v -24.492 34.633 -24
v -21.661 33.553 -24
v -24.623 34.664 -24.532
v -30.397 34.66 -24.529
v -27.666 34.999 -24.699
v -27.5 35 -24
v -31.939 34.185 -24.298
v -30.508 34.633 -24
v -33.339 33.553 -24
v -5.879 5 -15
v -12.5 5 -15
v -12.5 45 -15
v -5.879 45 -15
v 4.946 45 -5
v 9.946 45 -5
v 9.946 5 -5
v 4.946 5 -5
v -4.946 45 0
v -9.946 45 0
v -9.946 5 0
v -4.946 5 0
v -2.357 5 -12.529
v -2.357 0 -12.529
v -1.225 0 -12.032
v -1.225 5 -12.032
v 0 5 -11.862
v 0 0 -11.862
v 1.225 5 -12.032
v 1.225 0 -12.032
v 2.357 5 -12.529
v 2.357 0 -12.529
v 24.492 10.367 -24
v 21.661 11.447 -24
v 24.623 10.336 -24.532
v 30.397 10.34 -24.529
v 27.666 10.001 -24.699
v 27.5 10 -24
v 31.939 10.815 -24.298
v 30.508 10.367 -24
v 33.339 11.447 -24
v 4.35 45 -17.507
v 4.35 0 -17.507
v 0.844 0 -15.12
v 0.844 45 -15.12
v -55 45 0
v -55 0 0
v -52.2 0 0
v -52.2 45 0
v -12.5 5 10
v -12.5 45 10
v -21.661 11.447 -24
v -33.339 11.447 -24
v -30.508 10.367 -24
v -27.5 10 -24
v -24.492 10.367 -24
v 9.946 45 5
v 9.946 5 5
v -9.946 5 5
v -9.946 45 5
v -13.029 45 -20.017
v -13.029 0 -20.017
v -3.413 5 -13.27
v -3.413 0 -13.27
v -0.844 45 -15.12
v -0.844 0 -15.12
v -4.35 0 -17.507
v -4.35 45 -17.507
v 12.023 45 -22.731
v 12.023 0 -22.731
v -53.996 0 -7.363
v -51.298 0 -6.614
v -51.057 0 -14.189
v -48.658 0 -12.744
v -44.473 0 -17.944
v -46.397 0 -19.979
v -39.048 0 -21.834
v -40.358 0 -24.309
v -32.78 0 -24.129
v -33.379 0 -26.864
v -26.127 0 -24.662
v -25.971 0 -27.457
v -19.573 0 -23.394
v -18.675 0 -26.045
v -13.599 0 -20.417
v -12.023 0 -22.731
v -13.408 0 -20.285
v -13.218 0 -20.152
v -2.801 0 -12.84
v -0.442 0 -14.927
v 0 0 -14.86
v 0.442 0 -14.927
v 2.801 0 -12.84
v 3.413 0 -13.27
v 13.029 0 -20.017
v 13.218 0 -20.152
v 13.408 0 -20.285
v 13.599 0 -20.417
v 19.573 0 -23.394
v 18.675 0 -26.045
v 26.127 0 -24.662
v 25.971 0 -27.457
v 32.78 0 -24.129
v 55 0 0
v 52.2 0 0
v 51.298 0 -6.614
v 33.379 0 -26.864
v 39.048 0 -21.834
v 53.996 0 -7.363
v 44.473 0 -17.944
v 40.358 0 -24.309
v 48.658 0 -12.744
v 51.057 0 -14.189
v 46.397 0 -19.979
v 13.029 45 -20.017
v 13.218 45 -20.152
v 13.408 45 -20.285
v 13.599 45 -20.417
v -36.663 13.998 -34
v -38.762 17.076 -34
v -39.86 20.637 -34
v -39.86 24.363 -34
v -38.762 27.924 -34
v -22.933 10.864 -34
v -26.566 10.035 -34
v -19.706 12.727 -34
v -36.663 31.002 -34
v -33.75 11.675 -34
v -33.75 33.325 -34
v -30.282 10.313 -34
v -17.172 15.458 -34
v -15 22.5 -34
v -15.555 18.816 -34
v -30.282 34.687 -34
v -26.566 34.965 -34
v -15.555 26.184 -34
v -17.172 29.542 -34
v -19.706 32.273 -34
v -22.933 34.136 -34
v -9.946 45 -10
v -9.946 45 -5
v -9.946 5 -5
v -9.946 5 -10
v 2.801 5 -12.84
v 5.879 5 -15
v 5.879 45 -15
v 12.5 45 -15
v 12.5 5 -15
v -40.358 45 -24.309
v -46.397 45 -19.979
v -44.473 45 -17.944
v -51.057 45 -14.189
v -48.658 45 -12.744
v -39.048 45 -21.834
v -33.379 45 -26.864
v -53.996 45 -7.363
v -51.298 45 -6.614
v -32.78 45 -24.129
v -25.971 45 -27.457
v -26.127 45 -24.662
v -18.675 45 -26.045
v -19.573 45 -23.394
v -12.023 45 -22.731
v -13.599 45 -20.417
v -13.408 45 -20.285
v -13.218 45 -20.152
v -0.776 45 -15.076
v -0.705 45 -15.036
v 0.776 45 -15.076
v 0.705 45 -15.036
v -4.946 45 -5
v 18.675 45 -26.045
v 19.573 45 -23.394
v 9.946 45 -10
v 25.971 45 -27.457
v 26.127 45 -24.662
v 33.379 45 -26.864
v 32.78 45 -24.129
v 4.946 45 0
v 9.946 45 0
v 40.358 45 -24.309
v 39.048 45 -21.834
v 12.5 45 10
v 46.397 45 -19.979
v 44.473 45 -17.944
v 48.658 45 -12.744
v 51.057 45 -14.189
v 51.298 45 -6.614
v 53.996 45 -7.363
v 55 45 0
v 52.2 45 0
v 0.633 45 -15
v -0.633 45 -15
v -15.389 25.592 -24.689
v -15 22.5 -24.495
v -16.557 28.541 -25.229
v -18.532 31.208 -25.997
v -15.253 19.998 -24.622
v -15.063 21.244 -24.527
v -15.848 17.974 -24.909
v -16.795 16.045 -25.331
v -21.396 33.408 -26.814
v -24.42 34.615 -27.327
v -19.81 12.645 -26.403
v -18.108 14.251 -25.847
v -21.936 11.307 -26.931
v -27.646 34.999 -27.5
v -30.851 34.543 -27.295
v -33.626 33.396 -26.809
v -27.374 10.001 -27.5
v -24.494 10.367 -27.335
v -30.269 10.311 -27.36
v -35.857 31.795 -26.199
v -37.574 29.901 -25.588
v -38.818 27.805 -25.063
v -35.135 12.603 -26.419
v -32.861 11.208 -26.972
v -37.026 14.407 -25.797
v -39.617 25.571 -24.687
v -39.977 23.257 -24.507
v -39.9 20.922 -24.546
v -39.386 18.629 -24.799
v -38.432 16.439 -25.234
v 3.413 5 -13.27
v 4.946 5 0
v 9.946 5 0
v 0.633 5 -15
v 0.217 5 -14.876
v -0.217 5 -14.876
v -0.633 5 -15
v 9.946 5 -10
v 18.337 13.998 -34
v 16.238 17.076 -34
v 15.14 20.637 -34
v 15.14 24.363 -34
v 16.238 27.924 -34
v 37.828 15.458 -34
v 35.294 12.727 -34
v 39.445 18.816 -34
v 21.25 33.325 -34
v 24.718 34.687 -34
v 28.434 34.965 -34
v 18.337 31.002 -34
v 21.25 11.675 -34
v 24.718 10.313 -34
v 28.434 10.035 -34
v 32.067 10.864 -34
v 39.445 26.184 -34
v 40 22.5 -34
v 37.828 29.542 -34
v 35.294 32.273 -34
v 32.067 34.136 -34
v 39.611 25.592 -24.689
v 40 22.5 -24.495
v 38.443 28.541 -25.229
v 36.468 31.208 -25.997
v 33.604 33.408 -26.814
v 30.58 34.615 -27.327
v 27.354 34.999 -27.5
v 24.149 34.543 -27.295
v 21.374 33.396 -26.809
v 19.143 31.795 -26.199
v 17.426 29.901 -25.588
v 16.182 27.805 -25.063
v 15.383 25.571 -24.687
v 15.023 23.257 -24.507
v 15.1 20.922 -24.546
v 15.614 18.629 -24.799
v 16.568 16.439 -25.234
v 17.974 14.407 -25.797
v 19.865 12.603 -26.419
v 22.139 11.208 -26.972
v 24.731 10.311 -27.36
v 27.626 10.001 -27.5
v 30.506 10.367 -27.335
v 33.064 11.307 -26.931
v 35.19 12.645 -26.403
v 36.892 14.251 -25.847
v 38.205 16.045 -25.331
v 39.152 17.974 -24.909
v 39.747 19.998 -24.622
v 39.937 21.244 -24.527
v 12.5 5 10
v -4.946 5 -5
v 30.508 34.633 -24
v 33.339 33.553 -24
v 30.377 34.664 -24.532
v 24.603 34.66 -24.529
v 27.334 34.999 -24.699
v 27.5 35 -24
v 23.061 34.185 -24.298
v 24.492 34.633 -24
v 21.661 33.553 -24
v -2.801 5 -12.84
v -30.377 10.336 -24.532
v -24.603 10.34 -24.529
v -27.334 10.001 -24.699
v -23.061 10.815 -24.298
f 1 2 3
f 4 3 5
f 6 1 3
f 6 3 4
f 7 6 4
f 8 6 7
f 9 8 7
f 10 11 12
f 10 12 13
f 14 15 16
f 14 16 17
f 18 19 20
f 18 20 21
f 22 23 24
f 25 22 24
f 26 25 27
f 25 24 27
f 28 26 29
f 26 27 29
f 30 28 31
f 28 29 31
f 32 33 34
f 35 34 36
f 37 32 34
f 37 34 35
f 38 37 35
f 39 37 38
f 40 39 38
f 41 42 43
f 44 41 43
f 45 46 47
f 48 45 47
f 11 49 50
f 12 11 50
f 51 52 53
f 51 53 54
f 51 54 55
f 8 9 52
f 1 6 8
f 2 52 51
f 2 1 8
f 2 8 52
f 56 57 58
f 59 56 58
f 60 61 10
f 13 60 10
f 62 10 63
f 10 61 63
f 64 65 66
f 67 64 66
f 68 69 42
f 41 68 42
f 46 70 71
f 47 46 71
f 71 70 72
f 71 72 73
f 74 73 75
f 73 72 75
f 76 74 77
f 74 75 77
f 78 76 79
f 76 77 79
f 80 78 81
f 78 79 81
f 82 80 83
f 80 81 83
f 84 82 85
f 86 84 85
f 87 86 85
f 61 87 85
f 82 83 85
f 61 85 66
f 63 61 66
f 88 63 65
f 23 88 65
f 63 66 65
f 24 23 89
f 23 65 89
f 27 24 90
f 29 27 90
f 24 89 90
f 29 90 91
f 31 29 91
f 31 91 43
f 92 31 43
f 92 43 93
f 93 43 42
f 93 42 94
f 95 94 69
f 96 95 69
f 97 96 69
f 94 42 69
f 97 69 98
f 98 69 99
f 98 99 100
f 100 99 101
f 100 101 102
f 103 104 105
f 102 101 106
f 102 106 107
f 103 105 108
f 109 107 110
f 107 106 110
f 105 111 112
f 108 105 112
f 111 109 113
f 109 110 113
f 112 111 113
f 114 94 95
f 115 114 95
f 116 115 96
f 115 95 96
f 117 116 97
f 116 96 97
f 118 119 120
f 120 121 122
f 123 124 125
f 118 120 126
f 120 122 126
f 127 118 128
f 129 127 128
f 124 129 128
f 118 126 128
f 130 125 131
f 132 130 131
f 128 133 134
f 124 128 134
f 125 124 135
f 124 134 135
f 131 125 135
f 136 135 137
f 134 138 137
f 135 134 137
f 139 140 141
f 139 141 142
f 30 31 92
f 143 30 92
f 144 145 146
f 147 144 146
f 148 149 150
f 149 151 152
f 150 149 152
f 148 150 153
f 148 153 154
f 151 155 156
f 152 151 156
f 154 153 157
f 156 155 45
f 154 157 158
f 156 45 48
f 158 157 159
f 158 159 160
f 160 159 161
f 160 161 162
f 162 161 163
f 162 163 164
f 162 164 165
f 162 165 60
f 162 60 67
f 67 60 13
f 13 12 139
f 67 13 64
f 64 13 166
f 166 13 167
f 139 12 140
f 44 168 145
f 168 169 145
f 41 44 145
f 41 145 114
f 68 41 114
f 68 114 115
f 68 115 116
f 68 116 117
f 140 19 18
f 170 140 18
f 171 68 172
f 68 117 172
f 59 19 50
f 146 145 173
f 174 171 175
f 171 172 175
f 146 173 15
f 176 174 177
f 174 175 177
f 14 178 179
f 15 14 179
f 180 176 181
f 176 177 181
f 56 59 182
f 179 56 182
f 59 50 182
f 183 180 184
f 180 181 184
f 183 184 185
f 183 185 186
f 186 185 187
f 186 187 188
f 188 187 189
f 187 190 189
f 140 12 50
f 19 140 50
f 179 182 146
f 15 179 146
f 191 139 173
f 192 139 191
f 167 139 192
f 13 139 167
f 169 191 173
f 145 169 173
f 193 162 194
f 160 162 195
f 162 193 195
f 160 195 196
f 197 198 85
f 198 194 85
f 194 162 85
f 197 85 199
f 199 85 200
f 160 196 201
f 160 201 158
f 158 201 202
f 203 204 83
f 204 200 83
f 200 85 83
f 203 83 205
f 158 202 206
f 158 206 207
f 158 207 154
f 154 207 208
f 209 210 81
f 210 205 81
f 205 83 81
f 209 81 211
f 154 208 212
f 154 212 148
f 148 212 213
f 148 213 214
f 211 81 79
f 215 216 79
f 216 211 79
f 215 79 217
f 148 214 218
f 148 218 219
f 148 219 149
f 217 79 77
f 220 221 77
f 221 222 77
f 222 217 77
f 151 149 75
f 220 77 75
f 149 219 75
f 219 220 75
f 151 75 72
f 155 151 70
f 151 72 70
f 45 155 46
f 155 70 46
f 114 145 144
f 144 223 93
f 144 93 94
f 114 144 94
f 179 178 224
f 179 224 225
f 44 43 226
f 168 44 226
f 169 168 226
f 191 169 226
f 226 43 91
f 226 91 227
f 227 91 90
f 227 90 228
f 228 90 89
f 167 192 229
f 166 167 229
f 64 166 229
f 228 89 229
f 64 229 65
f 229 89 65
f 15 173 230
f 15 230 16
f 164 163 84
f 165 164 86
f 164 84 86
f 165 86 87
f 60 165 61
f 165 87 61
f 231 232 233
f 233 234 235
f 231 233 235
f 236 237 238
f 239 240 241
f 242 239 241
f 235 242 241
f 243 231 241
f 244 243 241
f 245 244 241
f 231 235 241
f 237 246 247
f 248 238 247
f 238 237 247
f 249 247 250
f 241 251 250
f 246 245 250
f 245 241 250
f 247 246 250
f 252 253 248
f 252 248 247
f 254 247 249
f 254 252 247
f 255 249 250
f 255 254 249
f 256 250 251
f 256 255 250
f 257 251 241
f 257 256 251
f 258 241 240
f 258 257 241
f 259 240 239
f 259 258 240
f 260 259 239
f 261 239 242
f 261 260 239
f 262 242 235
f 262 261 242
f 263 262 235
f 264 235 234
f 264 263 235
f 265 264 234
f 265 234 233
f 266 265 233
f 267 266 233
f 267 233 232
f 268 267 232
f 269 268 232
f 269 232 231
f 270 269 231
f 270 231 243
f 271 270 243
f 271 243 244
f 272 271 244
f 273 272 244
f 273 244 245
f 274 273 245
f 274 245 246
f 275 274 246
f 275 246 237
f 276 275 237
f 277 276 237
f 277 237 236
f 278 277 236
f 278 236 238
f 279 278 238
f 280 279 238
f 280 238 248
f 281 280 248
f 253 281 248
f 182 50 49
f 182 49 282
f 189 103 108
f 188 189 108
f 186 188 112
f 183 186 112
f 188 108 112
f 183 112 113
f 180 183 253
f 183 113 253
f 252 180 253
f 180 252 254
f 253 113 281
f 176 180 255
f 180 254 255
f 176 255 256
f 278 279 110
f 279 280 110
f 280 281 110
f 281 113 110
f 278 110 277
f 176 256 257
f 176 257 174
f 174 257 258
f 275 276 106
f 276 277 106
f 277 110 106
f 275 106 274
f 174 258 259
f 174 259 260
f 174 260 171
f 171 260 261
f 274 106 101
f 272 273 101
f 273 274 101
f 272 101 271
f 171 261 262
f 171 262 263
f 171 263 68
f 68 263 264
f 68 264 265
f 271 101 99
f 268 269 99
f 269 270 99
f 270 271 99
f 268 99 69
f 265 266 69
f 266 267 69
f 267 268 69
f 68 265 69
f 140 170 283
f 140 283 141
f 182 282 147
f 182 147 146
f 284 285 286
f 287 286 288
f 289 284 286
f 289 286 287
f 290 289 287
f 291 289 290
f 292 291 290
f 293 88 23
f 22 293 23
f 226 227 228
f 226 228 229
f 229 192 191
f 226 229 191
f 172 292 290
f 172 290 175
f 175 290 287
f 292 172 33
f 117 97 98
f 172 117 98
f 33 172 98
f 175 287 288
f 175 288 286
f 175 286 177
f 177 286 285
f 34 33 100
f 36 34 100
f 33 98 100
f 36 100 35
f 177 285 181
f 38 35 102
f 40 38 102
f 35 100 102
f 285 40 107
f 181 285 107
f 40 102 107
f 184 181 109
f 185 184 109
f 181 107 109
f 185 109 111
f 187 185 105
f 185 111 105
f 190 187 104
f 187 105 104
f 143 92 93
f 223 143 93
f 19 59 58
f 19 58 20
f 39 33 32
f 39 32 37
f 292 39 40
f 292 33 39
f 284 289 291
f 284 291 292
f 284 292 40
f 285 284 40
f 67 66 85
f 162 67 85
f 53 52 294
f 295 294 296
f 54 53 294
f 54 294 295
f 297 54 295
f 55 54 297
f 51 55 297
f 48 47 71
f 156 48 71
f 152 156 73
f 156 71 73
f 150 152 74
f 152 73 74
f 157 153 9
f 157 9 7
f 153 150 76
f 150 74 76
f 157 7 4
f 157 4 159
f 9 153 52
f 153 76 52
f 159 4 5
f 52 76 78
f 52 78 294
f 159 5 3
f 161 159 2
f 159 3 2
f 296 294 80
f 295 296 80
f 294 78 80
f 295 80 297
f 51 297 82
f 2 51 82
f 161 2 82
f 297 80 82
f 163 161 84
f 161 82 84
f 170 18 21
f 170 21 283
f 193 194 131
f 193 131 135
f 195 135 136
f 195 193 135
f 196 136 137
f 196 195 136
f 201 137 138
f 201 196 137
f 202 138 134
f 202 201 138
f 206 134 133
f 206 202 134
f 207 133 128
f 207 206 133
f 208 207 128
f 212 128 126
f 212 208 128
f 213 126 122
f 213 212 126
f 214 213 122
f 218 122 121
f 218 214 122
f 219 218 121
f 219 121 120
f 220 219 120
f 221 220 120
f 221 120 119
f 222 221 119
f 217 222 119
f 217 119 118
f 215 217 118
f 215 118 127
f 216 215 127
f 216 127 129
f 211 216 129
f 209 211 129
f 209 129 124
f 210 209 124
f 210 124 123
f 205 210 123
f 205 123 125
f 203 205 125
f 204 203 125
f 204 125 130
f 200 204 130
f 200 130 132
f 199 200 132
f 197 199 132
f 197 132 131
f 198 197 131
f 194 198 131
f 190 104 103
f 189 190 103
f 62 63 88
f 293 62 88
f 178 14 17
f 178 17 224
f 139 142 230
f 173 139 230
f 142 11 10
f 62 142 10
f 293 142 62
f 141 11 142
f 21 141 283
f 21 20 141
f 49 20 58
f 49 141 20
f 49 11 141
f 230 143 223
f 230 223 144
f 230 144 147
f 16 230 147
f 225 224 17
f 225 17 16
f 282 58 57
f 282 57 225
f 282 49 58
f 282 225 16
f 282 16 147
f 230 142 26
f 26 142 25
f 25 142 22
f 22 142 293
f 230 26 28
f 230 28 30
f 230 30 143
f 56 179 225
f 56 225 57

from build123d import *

# Parameters (mm, degrees)
BOSS_EXTRUDE2_DEPTH     = 45
BOSS_EXTRUDE4_START     = -24
SKETCH2_R               = 12.5
BOSS_EXTRUDE4_DEPTH     = 10
BOSS_EXTRUDE6_START     = 10
SKETCH3_W               = 25
SKETCH3_H               = 40
BOSS_EXTRUDE6_DEPTH     = 25
CUT_EXTRUDE1_DEPTH      = 46.0000001
CUT_EXTRUDE1_DEPTH_BACK = 20


with BuildPart() as part:
    # Sketch1 → Boss-Extrude2 (new body)
    with BuildSketch(Plane(origin=(0, 0, 0), x_dir=(1, 0, 0), z_dir=(0, 1, 0))):
        with BuildLine():
            ThreePointArc((-2.801227604, 12.840197836), (-3.388966753, 13.401826964), (-3.866028841, 14.06006427))
            ThreePointArc((-3.866028841, 14.06006427), (-3.636455498, 13.666793472), (-3.413425605, 13.269775202))
            Line((-3.413425605, 13.269775202), (-2.801227604, 12.840197836))
        make_face()
        with BuildLine():
            Line((-4.349767454, 17.506911707), (-12.023106204, 22.731382677))
            ThreePointArc((-12.023106204, 22.731382677), (-7.469700948, 18.842428715), (-3.866028841, 14.06006427))
            ThreePointArc((-3.866028841, 14.06006427), (-4.454774574, 15.734806542), (-4.349767454, 17.506911707))
        make_face()
        with BuildLine():
            Line((-0.844194207, 15.120106399), (-4.349767454, 17.506911707))
            ThreePointArc((-4.349767454, 17.506911707), (-4.454774574, 15.734806542), (-3.866028841, 14.06006427))
            ThreePointArc((-3.866028841, 14.06006427), (-3.388966753, 13.401826964), (-2.801227604, 12.840197836))
            Line((-2.801227604, 12.840197836), (-2.357112674, 12.528563819))
            ThreePointArc((-2.357112674, 12.528563819), (0, 11.861568788), (2.357112674, 12.528563819))
            Line((2.357112674, 12.528563819), (2.801227604, 12.840197836))
            ThreePointArc((2.801227604, 12.840197836), (3.388966727, 13.401826933), (3.8660288, 14.0600642))
            ThreePointArc((3.8660288, 14.0600642), (4.337450172, 15.167351949), (4.498431212, 16.36))
            ThreePointArc((4.498431212, 16.36), (4.461110458, 16.93825327), (4.349767454, 17.506911707))
            Line((4.349767454, 17.506911707), (0.844194207, 15.120106399))
            ThreePointArc((0.844194207, 15.120106399), (0, 14.86), (-0.844194207, 15.120106399))
        make_face()
        with BuildLine():
            Line((12.023106204, 22.731382677), (4.349767454, 17.506911707))
            ThreePointArc((4.349767454, 17.506911707), (4.461110458, 16.93825327), (4.498431212, 16.36))
            ThreePointArc((4.498431212, 16.36), (4.337450172, 15.167351949), (3.8660288, 14.0600642))
            ThreePointArc((3.8660288, 14.0600642), (7.46970092, 18.842428685), (12.023106204, 22.731382677))
        make_face()
        with BuildLine():
            Line((2.801227604, 12.840197836), (3.413425605, 13.269775202))
            ThreePointArc((3.413425605, 13.269775202), (3.636455478, 13.666793437), (3.8660288, 14.0600642))
            ThreePointArc((3.8660288, 14.0600642), (3.388966727, 13.401826933), (2.801227604, 12.840197836))
        make_face()
        with BuildLine():
            Line((52.2, 0), (55, 0))
            ThreePointArc((55, 0), (40.357593488, 24.309098908), (12.023106204, 22.731382677))
            ThreePointArc((12.023106204, 22.731382677), (7.46970092, 18.842428685), (3.8660288, 14.0600642))
            ThreePointArc((3.8660288, 14.0600642), (3.636455478, 13.666793437), (3.413425605, 13.269775202))
            Line((3.413425605, 13.269775202), (13.028813696, 20.016862066))
            ThreePointArc((13.028813696, 20.016862066), (13.312464415, 20.218897943), (13.59893539, 20.416914623))
            ThreePointArc((13.59893539, 20.416914623), (39.048456696, 21.833990655), (52.2, 0))
        make_face()
        with BuildLine():
            ThreePointArc((-12.023106204, 22.731382677), (-40.357593488, 24.309098908), (-55, 0))
            Line((-55, 0), (-52.2, 0))
            ThreePointArc((-52.2, 0), (-39.048456696, 21.833990655), (-13.59893539, 20.416914623))
            ThreePointArc((-13.59893539, 20.416914623), (-13.312464415, 20.218897943), (-13.028813696, 20.016862066))
            Line((-13.028813696, 20.016862066), (-3.413425605, 13.269775202))
            ThreePointArc((-3.413425605, 13.269775202), (-3.636455498, 13.666793472), (-3.866028841, 14.06006427))
            ThreePointArc((-3.866028841, 14.06006427), (-7.469700948, 18.842428715), (-12.023106204, 22.731382677))
        make_face()
    extrude(amount=BOSS_EXTRUDE2_DEPTH)

    # Sketch2 → Boss-Extrude4 (add)
    with BuildSketch(Plane.XY.offset(BOSS_EXTRUDE4_START)):
        with Locations((-27.5, 22.5)):
            Circle(SKETCH2_R)
        with Locations((27.5, 22.5)):
            Circle(SKETCH2_R)
    extrude(amount=-BOSS_EXTRUDE4_DEPTH)

    # Sketch3 → Boss-Extrude6 (add)
    with BuildSketch(Plane.XY.offset(BOSS_EXTRUDE6_START)):
        with Locations((0, 25)):
            Rectangle(SKETCH3_W, SKETCH3_H)
    extrude(amount=-BOSS_EXTRUDE6_DEPTH)

    # Sketch5 → Cut-Extrude1 (cut, two sides)
    with BuildSketch(Plane(origin=(0, 0, 0), x_dir=(1, 0, 0), z_dir=(0, 1, 0))) as cut_extrude1_sk:
        Polygon((-9.94603189, 10), (9.94603189, 10), (9.94603189, 5), (4.94603189, 5), (4.94603189, 0), (9.94603189, 0), (9.94603189, -5), (-9.94603189, -5), (-9.94603189, 0), (-4.94603189, 0), (-4.94603189, 5), (-9.94603189, 5), align=None)
    extrude(amount=CUT_EXTRUDE1_DEPTH, mode=Mode.SUBTRACT)
    extrude(cut_extrude1_sk.sketch, amount=-CUT_EXTRUDE1_DEPTH_BACK, mode=Mode.SUBTRACT)


solid = part.part
